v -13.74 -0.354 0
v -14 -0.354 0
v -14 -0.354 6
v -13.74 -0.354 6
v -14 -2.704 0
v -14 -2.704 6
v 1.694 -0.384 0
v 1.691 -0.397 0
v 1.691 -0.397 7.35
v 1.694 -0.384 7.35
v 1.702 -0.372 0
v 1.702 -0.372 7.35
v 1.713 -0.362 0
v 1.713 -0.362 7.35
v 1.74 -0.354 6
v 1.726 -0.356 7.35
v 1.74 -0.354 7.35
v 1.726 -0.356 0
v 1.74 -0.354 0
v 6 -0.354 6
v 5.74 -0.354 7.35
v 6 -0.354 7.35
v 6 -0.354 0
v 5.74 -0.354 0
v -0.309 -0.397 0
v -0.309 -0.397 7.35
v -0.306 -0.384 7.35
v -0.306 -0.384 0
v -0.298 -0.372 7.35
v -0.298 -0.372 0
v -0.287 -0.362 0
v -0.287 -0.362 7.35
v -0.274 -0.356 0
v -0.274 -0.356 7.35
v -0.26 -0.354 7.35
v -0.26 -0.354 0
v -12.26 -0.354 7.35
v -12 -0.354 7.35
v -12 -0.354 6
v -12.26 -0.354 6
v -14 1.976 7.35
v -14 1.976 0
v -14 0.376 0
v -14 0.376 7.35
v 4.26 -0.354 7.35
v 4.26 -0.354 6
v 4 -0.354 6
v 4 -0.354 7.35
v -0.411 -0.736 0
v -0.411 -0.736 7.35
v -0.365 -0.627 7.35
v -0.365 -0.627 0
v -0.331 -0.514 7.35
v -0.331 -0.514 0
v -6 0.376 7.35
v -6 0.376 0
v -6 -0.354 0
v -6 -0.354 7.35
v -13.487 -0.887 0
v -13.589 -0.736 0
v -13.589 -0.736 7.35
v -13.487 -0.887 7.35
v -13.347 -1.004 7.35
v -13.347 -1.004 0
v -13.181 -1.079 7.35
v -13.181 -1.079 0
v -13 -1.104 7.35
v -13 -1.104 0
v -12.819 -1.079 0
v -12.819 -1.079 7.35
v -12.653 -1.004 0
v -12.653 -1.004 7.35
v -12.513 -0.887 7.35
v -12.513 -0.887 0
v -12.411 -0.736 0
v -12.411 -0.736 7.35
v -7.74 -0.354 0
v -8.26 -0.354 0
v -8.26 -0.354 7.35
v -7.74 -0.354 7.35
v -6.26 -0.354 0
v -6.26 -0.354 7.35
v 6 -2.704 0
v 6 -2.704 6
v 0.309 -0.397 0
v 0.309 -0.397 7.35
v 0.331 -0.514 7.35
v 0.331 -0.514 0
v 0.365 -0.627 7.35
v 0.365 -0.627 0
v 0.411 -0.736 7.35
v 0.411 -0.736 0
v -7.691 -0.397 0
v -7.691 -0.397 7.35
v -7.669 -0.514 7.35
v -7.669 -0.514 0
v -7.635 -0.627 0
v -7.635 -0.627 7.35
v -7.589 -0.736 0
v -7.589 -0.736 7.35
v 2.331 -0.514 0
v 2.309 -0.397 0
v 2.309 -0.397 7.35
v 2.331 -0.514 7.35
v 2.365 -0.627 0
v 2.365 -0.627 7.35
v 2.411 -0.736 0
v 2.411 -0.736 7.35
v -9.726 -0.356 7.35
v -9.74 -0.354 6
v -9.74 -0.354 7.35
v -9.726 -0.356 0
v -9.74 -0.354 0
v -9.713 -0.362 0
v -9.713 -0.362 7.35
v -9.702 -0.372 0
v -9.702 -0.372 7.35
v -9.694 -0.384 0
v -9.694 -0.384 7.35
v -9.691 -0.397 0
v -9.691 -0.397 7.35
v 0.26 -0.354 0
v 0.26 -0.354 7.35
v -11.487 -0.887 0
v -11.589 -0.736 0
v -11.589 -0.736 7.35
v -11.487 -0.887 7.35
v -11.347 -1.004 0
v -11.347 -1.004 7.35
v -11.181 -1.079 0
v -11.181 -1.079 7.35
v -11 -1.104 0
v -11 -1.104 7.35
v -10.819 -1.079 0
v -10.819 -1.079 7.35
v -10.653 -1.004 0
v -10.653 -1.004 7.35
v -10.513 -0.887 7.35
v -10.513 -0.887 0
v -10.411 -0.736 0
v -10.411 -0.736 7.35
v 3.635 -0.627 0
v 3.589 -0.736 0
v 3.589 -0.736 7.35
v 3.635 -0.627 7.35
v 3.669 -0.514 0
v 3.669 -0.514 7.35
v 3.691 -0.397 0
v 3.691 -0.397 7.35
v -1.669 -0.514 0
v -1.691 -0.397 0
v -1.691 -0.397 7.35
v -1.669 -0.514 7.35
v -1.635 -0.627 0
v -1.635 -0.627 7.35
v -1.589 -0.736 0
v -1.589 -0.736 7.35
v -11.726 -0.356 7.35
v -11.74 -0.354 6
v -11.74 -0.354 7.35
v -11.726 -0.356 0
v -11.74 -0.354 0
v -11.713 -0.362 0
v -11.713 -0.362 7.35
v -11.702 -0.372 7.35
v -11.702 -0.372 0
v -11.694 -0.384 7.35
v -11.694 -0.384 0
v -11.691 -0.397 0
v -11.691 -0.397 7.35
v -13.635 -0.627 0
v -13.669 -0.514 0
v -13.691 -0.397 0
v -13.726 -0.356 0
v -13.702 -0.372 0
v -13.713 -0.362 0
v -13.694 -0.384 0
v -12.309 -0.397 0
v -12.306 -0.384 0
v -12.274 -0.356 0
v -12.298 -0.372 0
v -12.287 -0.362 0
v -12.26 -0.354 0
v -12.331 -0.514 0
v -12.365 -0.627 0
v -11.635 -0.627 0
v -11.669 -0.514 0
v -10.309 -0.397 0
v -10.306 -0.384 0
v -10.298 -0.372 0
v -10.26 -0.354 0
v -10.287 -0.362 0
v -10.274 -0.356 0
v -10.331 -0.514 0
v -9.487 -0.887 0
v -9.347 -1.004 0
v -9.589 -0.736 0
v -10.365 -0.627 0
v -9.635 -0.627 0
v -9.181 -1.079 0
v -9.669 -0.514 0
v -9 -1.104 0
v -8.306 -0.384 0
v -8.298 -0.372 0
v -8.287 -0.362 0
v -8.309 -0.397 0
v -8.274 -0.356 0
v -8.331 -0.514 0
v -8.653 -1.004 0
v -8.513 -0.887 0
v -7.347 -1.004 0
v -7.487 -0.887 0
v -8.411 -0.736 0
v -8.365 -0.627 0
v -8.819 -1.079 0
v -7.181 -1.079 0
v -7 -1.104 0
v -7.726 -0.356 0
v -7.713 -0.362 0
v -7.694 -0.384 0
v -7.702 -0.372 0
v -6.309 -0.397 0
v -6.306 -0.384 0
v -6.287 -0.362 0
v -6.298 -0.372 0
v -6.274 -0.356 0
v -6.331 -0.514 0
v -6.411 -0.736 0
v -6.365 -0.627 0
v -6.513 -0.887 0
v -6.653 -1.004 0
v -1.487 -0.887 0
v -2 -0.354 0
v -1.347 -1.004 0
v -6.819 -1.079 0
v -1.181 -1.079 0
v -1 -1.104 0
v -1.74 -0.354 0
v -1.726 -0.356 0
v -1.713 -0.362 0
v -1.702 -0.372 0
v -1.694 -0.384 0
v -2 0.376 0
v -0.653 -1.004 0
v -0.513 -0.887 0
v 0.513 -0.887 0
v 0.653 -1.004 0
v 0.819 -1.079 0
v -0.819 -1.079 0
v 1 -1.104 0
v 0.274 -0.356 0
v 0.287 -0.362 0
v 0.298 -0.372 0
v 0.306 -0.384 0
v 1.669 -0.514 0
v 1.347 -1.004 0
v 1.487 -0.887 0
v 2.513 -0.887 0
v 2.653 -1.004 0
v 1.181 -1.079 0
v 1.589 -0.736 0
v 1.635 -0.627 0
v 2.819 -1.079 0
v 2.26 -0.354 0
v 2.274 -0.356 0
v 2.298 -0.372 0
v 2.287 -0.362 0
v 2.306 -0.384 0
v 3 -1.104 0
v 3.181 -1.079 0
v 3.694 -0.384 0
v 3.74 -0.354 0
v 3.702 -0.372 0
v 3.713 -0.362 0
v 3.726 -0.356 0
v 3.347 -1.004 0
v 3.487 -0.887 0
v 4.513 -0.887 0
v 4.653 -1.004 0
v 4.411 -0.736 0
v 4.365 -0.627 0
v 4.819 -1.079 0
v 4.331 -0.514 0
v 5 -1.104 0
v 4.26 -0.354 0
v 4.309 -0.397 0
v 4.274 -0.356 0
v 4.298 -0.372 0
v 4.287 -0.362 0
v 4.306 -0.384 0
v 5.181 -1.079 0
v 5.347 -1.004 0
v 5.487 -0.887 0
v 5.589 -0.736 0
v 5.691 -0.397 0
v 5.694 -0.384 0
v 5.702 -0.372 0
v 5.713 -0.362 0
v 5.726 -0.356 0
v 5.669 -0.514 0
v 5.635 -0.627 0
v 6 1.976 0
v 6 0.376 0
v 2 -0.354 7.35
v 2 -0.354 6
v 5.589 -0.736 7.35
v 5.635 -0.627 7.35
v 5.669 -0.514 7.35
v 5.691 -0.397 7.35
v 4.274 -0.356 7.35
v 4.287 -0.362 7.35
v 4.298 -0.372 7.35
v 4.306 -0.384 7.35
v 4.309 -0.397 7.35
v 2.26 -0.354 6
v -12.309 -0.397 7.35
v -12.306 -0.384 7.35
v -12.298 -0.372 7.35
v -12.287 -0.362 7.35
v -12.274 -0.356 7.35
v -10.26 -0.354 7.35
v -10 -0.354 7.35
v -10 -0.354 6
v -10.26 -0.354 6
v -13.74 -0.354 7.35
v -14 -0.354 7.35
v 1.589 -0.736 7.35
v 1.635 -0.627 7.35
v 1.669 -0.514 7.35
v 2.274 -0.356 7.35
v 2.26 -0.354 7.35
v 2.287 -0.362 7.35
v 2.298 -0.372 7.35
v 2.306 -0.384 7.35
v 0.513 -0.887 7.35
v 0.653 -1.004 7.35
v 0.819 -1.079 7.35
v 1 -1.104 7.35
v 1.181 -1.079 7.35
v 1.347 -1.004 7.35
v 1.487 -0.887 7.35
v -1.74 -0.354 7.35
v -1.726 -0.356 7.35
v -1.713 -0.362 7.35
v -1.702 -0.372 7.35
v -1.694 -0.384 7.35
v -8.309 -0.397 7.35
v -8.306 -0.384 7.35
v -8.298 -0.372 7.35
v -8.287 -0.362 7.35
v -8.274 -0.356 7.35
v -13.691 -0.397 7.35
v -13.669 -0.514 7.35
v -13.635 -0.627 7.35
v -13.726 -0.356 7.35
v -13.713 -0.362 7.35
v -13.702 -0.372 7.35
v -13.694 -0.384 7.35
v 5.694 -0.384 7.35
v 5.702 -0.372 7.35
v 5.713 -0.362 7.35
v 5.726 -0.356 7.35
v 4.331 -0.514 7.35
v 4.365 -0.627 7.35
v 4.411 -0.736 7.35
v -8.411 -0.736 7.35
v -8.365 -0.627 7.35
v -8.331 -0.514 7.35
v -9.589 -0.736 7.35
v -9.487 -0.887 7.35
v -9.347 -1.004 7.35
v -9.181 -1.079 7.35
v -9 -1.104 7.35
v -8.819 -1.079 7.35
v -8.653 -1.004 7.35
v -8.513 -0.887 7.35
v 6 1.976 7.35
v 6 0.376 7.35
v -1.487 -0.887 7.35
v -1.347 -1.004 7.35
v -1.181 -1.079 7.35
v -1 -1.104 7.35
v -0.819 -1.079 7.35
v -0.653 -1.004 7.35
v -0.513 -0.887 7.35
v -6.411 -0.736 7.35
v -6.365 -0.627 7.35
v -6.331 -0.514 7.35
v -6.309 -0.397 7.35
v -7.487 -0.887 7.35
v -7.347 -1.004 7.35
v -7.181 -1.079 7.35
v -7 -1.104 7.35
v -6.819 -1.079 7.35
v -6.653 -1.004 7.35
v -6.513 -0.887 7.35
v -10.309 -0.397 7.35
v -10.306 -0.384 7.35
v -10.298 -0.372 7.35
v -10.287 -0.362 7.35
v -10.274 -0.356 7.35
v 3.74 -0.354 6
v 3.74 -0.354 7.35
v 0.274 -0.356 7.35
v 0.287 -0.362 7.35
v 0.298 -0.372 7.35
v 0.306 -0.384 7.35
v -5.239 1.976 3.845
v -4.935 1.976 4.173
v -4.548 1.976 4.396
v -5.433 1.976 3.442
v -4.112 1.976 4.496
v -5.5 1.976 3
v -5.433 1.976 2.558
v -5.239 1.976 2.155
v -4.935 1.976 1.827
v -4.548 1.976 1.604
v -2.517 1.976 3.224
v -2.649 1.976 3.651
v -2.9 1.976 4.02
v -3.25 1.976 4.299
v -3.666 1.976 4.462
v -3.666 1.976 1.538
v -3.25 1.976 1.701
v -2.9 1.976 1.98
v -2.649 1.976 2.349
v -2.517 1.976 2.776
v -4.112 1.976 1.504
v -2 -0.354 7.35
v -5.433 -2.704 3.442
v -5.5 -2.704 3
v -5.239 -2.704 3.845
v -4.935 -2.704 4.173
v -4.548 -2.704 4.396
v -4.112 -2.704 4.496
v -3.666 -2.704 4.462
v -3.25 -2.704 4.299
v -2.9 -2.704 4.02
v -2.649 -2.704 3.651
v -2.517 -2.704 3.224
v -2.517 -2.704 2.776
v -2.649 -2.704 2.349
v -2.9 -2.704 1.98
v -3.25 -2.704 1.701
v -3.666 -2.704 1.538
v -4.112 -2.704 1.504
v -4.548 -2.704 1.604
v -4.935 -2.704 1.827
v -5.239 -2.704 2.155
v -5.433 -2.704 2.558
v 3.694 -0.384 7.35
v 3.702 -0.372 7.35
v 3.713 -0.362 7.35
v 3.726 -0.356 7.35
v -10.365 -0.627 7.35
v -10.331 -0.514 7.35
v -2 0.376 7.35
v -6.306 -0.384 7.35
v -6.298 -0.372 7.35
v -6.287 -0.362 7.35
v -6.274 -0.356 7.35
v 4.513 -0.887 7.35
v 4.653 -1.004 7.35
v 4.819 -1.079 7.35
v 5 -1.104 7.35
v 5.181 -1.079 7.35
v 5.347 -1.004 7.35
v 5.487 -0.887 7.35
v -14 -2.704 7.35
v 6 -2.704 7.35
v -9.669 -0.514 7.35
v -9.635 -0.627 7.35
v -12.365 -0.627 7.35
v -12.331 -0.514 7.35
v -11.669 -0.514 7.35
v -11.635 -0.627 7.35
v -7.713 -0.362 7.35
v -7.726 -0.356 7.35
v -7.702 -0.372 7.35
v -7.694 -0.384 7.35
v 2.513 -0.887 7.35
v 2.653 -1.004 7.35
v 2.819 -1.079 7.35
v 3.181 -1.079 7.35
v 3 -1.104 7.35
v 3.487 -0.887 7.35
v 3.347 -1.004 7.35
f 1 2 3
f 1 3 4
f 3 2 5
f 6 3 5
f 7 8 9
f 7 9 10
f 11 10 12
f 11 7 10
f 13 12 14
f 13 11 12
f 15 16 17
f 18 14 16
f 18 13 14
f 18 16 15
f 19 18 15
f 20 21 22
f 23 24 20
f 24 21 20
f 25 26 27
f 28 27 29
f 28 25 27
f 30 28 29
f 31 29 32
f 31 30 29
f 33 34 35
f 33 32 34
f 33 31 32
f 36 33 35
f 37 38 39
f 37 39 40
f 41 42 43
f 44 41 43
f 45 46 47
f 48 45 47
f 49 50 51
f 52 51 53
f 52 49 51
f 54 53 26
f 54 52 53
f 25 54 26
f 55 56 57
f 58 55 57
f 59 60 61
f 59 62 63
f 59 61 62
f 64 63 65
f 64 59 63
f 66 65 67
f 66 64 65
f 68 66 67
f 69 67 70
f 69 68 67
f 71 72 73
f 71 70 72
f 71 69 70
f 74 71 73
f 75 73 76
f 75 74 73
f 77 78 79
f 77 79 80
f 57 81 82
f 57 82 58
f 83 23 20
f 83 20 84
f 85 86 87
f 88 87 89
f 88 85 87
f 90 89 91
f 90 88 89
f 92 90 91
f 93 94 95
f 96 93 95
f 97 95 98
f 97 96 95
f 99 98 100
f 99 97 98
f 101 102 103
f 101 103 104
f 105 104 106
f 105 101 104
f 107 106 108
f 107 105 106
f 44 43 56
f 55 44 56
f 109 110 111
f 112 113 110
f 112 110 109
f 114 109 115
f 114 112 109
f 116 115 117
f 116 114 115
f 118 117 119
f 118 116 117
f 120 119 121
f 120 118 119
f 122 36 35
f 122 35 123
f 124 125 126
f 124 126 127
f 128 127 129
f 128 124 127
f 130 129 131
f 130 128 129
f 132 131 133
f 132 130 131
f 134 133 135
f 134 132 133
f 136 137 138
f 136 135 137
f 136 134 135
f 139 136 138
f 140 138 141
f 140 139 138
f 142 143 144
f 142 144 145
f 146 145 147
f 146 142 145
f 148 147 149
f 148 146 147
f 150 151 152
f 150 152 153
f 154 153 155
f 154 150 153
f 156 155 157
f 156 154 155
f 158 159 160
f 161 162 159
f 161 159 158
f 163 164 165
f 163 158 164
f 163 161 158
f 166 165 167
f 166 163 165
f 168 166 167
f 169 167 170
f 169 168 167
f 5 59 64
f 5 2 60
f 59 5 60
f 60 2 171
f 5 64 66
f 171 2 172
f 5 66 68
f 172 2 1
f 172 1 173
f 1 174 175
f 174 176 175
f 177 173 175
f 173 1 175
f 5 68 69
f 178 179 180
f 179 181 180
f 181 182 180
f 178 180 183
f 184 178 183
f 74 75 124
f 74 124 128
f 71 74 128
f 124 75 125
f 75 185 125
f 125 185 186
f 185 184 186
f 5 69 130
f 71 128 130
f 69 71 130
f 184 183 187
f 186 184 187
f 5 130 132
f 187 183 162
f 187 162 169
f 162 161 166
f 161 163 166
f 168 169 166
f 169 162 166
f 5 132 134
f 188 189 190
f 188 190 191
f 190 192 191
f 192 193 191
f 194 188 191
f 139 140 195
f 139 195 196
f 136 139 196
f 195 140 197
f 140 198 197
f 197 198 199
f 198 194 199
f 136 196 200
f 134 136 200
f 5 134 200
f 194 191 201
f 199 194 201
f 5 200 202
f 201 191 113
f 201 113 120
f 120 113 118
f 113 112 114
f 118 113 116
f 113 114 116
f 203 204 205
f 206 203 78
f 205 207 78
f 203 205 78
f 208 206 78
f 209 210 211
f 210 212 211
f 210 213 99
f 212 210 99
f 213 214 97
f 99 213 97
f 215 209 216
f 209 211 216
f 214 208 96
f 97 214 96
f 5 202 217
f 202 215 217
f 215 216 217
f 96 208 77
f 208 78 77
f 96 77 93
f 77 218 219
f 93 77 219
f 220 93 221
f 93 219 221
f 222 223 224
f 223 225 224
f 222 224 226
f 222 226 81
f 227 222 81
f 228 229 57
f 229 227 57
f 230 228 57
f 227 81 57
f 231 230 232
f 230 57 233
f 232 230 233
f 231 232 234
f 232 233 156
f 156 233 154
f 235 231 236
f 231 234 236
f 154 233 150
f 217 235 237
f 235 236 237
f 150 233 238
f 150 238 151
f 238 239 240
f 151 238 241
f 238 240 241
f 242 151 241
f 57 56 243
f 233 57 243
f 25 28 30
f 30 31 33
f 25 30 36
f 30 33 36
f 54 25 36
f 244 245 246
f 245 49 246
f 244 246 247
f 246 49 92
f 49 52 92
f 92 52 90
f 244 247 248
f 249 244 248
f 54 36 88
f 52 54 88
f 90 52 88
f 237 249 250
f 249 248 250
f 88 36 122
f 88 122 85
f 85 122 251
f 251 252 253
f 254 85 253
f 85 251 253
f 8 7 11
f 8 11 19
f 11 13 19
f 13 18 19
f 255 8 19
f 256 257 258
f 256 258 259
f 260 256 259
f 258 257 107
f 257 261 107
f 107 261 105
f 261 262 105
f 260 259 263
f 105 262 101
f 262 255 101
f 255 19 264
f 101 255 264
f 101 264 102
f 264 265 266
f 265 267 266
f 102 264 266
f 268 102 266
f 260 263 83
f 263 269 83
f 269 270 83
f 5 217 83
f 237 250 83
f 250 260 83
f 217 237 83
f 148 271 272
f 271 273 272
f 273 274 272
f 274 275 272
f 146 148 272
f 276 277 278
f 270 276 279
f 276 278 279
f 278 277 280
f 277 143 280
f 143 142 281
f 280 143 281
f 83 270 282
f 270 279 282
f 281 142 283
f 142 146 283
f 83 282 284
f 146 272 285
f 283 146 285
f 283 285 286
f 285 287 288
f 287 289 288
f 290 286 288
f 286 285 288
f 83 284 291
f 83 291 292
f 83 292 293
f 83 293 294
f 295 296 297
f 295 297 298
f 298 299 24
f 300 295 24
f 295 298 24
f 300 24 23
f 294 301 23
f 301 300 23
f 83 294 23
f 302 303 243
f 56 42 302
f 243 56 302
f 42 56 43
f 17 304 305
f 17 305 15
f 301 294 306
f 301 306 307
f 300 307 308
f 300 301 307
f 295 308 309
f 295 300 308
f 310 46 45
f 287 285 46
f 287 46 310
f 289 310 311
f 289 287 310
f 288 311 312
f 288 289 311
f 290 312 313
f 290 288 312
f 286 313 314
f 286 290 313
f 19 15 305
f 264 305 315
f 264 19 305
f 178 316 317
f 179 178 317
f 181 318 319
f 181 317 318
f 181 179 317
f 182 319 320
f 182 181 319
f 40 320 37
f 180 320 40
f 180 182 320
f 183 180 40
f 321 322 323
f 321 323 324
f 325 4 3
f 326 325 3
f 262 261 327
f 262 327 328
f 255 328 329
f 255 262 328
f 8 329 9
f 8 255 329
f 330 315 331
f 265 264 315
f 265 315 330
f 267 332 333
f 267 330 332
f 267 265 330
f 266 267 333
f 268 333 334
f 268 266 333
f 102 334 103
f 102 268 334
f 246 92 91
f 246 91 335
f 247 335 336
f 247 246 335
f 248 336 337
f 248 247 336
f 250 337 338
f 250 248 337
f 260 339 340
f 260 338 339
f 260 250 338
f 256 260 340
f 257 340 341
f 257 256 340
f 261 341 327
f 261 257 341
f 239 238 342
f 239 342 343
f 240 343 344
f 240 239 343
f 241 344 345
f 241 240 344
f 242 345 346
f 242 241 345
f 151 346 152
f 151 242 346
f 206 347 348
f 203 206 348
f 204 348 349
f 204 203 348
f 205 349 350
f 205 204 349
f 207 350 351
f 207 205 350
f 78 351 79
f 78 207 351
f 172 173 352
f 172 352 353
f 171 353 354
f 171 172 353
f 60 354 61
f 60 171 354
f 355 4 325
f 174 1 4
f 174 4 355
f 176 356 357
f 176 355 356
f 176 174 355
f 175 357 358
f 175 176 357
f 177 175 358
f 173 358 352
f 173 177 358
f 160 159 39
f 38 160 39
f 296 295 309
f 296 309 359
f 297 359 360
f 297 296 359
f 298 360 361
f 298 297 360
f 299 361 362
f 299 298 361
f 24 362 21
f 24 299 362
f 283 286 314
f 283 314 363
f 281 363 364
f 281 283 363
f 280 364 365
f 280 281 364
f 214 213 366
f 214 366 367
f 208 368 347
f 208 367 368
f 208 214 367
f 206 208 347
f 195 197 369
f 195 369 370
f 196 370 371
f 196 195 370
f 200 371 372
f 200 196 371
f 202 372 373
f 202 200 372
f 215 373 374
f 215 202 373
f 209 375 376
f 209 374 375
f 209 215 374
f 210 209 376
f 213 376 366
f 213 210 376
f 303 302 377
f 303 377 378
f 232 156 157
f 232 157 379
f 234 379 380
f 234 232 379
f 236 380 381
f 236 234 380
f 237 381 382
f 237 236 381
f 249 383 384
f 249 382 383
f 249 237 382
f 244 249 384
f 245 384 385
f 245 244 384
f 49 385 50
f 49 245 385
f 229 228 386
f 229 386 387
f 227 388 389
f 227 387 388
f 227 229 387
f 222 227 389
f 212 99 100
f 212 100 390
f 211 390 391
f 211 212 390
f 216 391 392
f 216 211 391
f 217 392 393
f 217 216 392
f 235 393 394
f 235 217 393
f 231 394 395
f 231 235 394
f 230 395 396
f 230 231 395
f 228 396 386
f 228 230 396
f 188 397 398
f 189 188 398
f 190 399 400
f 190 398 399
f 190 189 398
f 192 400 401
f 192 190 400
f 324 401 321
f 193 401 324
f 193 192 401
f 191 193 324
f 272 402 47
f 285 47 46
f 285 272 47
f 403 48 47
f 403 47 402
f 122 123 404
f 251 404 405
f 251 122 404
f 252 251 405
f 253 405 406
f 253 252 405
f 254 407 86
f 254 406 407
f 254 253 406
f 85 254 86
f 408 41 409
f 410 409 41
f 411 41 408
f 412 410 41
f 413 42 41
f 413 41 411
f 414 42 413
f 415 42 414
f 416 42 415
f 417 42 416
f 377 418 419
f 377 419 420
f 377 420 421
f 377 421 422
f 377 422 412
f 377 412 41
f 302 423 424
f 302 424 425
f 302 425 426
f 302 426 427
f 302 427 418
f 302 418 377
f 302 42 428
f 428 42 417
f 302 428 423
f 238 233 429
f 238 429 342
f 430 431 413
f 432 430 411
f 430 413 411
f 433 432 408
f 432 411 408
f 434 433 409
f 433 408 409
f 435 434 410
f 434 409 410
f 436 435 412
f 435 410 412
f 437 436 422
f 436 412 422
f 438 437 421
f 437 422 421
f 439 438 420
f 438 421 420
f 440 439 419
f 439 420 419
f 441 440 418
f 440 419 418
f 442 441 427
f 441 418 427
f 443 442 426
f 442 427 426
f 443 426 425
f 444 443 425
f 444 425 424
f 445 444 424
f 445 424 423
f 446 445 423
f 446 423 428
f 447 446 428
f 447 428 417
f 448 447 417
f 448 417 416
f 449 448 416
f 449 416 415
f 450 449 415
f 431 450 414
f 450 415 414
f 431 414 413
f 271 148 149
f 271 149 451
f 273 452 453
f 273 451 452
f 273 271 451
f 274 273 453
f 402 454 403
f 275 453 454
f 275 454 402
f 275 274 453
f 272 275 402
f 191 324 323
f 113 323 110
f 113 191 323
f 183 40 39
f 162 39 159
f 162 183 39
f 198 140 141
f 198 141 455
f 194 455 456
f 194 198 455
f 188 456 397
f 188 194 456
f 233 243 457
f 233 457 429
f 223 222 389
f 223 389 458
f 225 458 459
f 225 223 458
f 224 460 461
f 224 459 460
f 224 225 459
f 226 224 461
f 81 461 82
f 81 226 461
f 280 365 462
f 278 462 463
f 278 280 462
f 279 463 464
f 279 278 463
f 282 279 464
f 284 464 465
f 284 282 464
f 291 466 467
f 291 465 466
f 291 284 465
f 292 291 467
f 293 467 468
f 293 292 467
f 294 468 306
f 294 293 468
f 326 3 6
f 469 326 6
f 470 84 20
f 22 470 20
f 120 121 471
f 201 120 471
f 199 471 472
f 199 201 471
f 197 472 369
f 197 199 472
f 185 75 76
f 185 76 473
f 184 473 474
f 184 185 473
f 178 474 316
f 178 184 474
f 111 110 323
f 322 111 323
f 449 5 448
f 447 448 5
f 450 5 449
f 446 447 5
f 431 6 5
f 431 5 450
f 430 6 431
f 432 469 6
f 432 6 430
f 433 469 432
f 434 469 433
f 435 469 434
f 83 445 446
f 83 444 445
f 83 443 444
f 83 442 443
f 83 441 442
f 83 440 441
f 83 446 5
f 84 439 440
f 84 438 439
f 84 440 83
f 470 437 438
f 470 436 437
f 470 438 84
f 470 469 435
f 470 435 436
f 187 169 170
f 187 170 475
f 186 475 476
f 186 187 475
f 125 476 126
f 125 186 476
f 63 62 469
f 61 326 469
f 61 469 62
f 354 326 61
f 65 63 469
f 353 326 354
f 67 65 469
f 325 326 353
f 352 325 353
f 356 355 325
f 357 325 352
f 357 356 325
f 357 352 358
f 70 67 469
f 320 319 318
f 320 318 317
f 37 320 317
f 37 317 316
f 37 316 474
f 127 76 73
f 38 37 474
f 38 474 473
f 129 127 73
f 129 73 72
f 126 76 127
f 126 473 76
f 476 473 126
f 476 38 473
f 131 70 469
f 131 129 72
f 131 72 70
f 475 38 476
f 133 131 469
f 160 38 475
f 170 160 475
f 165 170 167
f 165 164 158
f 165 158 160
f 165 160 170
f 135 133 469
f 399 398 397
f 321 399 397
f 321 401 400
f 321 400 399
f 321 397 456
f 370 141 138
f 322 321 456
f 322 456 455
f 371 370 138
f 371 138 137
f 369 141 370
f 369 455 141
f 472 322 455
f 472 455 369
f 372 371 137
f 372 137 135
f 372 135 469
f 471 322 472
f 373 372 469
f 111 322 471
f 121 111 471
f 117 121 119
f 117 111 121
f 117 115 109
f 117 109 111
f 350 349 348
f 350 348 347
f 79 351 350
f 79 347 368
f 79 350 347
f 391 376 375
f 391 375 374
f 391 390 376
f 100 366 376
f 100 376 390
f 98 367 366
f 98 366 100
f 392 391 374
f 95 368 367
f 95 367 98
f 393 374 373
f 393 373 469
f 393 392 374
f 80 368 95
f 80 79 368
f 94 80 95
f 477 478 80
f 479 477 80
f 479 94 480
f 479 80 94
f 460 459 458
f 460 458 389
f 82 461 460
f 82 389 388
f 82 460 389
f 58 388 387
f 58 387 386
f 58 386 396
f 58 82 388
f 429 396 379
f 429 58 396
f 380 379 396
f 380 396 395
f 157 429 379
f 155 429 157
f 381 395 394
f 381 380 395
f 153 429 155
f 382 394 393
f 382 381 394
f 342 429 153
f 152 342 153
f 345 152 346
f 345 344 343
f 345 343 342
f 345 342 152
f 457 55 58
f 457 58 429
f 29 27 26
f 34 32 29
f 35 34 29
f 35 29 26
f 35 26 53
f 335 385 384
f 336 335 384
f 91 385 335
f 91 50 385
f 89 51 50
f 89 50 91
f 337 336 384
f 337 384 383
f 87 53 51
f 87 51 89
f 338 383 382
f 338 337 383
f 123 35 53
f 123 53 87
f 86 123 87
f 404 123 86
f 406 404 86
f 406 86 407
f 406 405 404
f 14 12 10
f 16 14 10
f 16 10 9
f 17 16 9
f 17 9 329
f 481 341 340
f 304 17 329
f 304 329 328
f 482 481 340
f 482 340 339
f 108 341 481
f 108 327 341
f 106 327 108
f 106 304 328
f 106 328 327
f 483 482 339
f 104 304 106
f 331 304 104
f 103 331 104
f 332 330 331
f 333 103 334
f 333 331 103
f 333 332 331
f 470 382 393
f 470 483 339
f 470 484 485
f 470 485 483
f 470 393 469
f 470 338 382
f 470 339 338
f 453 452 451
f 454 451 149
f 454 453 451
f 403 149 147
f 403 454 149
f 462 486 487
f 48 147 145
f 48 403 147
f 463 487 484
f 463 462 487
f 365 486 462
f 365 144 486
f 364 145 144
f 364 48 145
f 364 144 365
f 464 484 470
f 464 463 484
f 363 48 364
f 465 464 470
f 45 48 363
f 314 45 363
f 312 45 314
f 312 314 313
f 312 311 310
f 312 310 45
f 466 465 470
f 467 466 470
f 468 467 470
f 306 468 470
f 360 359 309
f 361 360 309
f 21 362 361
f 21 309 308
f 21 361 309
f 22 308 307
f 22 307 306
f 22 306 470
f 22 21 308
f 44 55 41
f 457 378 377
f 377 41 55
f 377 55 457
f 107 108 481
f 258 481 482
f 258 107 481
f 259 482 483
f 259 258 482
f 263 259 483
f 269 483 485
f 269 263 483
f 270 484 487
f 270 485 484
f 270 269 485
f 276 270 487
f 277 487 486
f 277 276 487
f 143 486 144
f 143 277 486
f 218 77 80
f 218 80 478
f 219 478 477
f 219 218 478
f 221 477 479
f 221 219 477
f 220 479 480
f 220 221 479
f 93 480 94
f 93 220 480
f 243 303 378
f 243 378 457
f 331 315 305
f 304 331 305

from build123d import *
from OCP.BRepAlgoAPI import BRepAlgoAPI_Cut
from OCP.TopTools import TopTools_ListOfShape

# Parameters (mm, degrees)
BOSS_EXTRUDE1_DEPTH     = 6
SKETCH2_R               = 1.5
CUT_EXTRUDE1_DEPTH      = 17.153773553
CUT_EXTRUDE2_START      = -6
CUT_EXTRUDE2_DEPTH      = 6
SALIENTE_EXTRUIR1_DEPTH = 1.35
CORTAR_EXTRUIR1_START   = -0.3
CROQUIS5_W              = 20
CROQUIS5_H              = 7.35
CROQUIS5_R              = 1.5
CORTAR_EXTRUIR1_DEPTH   = 0.3
CROQUIS6_W              = 20
CROQUIS6_H              = 7.35
CROQUIS6_R              = 1.5
CORTAR_EXTRUIR2_DEPTH   = 0.4


with BuildPart() as part:
    # Sketch1 → Boss-Extrude1 (new body)
    with BuildSketch(Plane.XY):
        with BuildLine():
            Line((-0.259824575, -0.254), (0, -0.254))
            Line((0, -0.254), (0.259824575, -0.254))
            ThreePointArc((0.259824575, -0.254), (0.358731646, -0.291228588), (0.408543109, -0.384434783))
            ThreePointArc((0.408543109, -0.384434783), (0.442388286, -0.542062154), (0.501123596, -0.692202247))
            ThreePointArc((0.501123596, -0.692202247), (1, -1.004), (1.498876404, -0.692202247))
            ThreePointArc((1.498876404, -0.692202247), (1.557611714, -0.542062154), (1.591456891, -0.384434783))
            ThreePointArc((1.591456891, -0.384434783), (1.641268354, -0.291228588), (1.740175425, -0.254))
            Line((1.740175425, -0.254), (2, -0.254))
            Line((2, -0.254), (2.259824575, -0.254))
            ThreePointArc((2.259824575, -0.254), (2.358731646, -0.291228588), (2.408543109, -0.384434783))
            ThreePointArc((2.408543109, -0.384434783), (2.442388286, -0.542062154), (2.501123596, -0.692202247))
            ThreePointArc((2.501123596, -0.692202247), (3, -1.004), (3.498876404, -0.692202247))
            ThreePointArc((3.498876404, -0.692202247), (3.557611714, -0.542062154), (3.591456891, -0.384434783))
            ThreePointArc((3.591456891, -0.384434783), (3.641268354, -0.291228588), (3.740175425, -0.254))
            Line((3.740175425, -0.254), (4, -0.254))
            Line((4, -0.254), (4.259824575, -0.254))
            ThreePointArc((4.259824575, -0.254), (4.358731646, -0.291228588), (4.408543109, -0.384434783))
            ThreePointArc((4.408543109, -0.384434783), (4.442388286, -0.542062154), (4.501123596, -0.692202247))
            ThreePointArc((4.501123596, -0.692202247), (5, -1.004), (5.498876404, -0.692202247))
            ThreePointArc((5.498876404, -0.692202247), (5.557611714, -0.542062154), (5.591456891, -0.384434783))
            ThreePointArc((5.591456891, -0.384434783), (5.641268354, -0.291228588), (5.740175425, -0.254))
            Line((5.740175425, -0.254), (6, -0.254))
            Line((6, -0.254), (6, -3.004))
            Line((6, -3.004), (-3.198960597, -3.004))
            Line((-3.198960597, -3.004), (-4, -3.004))
            Line((-4, -3.004), (-4, 2.376))
            Line((-4, 2.376), (6, 2.376))
            Line((6, 2.376), (6, 0.376))
            Line((6, 0.376), (-2, 0.376))
            Line((-2, 0.376), (-2, -0.254))
            Line((-2, -0.254), (-1.740175425, -0.254))
            ThreePointArc((-1.740175425, -0.254), (-1.641268354, -0.291228588), (-1.591456891, -0.384434783))
            ThreePointArc((-1.591456891, -0.384434783), (-1.557611714, -0.542062154), (-1.498876404, -0.692202247))
            ThreePointArc((-1.498876404, -0.692202247), (-1, -1.004), (-0.501123596, -0.692202247))
            ThreePointArc((-0.501123596, -0.692202247), (-0.442388286, -0.542062154), (-0.408543109, -0.384434783))
            ThreePointArc((-0.408543109, -0.384434783), (-0.358731646, -0.291228588), (-0.259824575, -0.254))
        make_face()
    extrude(amount=BOSS_EXTRUDE1_DEPTH)

    # Mirror1: part across plane


with BuildPart() as part_1:
    add(part.part)
    add(part.part.mirror(Plane(origin=(-4, 2.376, 6), x_dir=(0, 0, 1), z_dir=(1, 0, 0))))

    # Sketch2 → Cut-Extrude1 (cut, through all)
    with BuildSketch(Plane(origin=(0, 2.376, 0), x_dir=(1, 0, 0), z_dir=(0, 1, 0))):
        with Locations(Location((-4, -3, 0), (0, 0, 180))):
            Circle(SKETCH2_R)
    extrude(amount=-CUT_EXTRUDE1_DEPTH, mode=Mode.SUBTRACT)


with BuildPart() as cut_extrude2_tool:
    # Cut-Extrude2: read off the stored shape, not the designer's step
    # Cut-Extrude2 outline → Cut-Extrude2 (new body)
    with BuildSketch(Plane.XY.offset(6).offset(CUT_EXTRUDE2_START)):
        with BuildLine():
            Line((-1.740175425, -0.254), (-2, -0.254))
            Line((-2, -0.254), (-2, -0.35400144))
            Line((-2, -0.35400144), (-1.740174871, -0.354))
            ThreePointArc((-1.740174871, -0.354), (-1.707206193, -0.366409712), (-1.690602581, -0.397478261))
            ThreePointArc((-1.690602581, -0.397478261), (-1.653372886, -0.570868369), (-1.588764045, -0.736022472))
            ThreePointArc((-1.588764045, -0.736022472), (-1, -1.104), (-0.411235955, -0.736022472))
            ThreePointArc((-0.411235955, -0.736022472), (-0.346627114, -0.570868369), (-0.309397419, -0.397478261))
            ThreePointArc((-0.309397419, -0.397478261), (-0.292793599, -0.366409529), (-0.259824575, -0.354))
            Line((-0.259824575, -0.354), (0.259824575, -0.354))
            ThreePointArc((0.259824575, -0.354), (0.292793599, -0.366409529), (0.309397419, -0.397478261))
            ThreePointArc((0.309397419, -0.397478261), (0.346627114, -0.570868369), (0.411235955, -0.736022472))
            ThreePointArc((0.411235955, -0.736022472), (1, -1.104), (1.588764045, -0.736022472))
            ThreePointArc((1.588764045, -0.736022472), (1.653372886, -0.570868369), (1.690602581, -0.397478261))
            ThreePointArc((1.690602581, -0.397478261), (1.707206401, -0.366409529), (1.740175425, -0.354))
            Line((1.740175425, -0.354), (2.259824575, -0.35400144))
            ThreePointArc((2.259824575, -0.35400144), (2.292793599, -0.366410969), (2.309397419, -0.397479701))
            ThreePointArc((2.309397419, -0.397479701), (2.346627114, -0.570869809), (2.411235955, -0.736023912))
            ThreePointArc((2.411235955, -0.736023912), (3, -1.10400144), (3.588764045, -0.736023912))
            ThreePointArc((3.588764045, -0.736023912), (3.653372886, -0.570869809), (3.690602581, -0.397479701))
            ThreePointArc((3.690602581, -0.397479701), (3.707206401, -0.366410969), (3.740175425, -0.35400144))
            Line((3.740175425, -0.35400144), (4.259824575, -0.35400288))
            ThreePointArc((4.259824575, -0.35400288), (4.292793599, -0.366412409), (4.309397419, -0.397481141))
            ThreePointArc((4.309397419, -0.397481141), (4.346627114, -0.570871249), (4.411235955, -0.736025352))
            ThreePointArc((4.411235955, -0.736025352), (5, -1.10400288), (5.588764045, -0.736025352))
            ThreePointArc((5.588764045, -0.736025352), (5.653372886, -0.570871249), (5.690602581, -0.397481141))
            ThreePointArc((5.690602581, -0.397481141), (5.707206401, -0.366412409), (5.740175425, -0.35400288))
            Line((5.740175425, -0.35400288), (5.999999446, -0.35400432))
            Line((5.999999446, -0.35400432), (6, -0.254))
            Line((6, -0.254), (5.740175425, -0.254))
            ThreePointArc((5.740175425, -0.254), (5.641268354, -0.291228588), (5.591456891, -0.384434783))
            ThreePointArc((5.591456891, -0.384434783), (5.557611714, -0.542062154), (5.498876404, -0.692202247))
            ThreePointArc((5.498876404, -0.692202247), (5, -1.004), (4.501123596, -0.692202247))
            ThreePointArc((4.501123596, -0.692202247), (4.442388286, -0.542062154), (4.408543109, -0.384434783))
            ThreePointArc((4.408543109, -0.384434783), (4.358731646, -0.291228588), (4.259824575, -0.254))
            Line((4.259824575, -0.254), (3.740175425, -0.254))
            ThreePointArc((3.740175425, -0.254), (3.641268354, -0.291228588), (3.591456891, -0.384434783))
            ThreePointArc((3.591456891, -0.384434783), (3.557611714, -0.542062154), (3.498876404, -0.692202247))
            ThreePointArc((3.498876404, -0.692202247), (3, -1.004), (2.501123596, -0.692202247))
            ThreePointArc((2.501123596, -0.692202247), (2.442388286, -0.542062154), (2.408543109, -0.384434783))
            ThreePointArc((2.408543109, -0.384434783), (2.358731646, -0.291228588), (2.259824575, -0.254))
            Line((2.259824575, -0.254), (1.740175425, -0.254))
            ThreePointArc((1.740175425, -0.254), (1.641268354, -0.291228588), (1.591456891, -0.384434783))
            ThreePointArc((1.591456891, -0.384434783), (1.557611714, -0.542062154), (1.498876404, -0.692202247))
            ThreePointArc((1.498876404, -0.692202247), (1, -1.004), (0.501123596, -0.692202247))
            ThreePointArc((0.501123596, -0.692202247), (0.442388286, -0.542062154), (0.408543109, -0.384434783))
            ThreePointArc((0.408543109, -0.384434783), (0.358731646, -0.291228588), (0.259824575, -0.254))
            Line((0.259824575, -0.254), (-0.259824575, -0.254))
            ThreePointArc((-0.259824575, -0.254), (-0.358731646, -0.291228588), (-0.408543109, -0.384434783))
            ThreePointArc((-0.408543109, -0.384434783), (-0.442388286, -0.542062154), (-0.501123596, -0.692202247))
            ThreePointArc((-0.501123596, -0.692202247), (-1, -1.004), (-1.498876404, -0.692202247))
            ThreePointArc((-1.498876404, -0.692202247), (-1.557611714, -0.542062154), (-1.591456891, -0.384434783))
            ThreePointArc((-1.591456891, -0.384434783), (-1.641268354, -0.291228588), (-1.740175425, -0.254))
        make_face()
        with BuildLine():
            Line((-6.259825129, -0.354), (-6, -0.35400144))
            Line((-6, -0.35400144), (-6, -0.254))
            Line((-6, -0.254), (-6.259824575, -0.254))
            ThreePointArc((-6.259824575, -0.254), (-6.358731646, -0.291228588), (-6.408543109, -0.384434783))
            ThreePointArc((-6.408543109, -0.384434783), (-6.442388286, -0.542062154), (-6.501123596, -0.692202247))
            ThreePointArc((-6.501123596, -0.692202247), (-7, -1.004), (-7.498876404, -0.692202247))
            ThreePointArc((-7.498876404, -0.692202247), (-7.557611714, -0.542062154), (-7.591456891, -0.384434783))
            ThreePointArc((-7.591456891, -0.384434783), (-7.641268354, -0.291228588), (-7.740175425, -0.254))
            Line((-7.740175425, -0.254), (-8.259824575, -0.254))
            ThreePointArc((-8.259824575, -0.254), (-8.358731646, -0.291228588), (-8.408543109, -0.384434783))
            ThreePointArc((-8.408543109, -0.384434783), (-8.442388286, -0.542062154), (-8.501123596, -0.692202247))
            ThreePointArc((-8.501123596, -0.692202247), (-9, -1.004), (-9.498876404, -0.692202247))
            ThreePointArc((-9.498876404, -0.692202247), (-9.557611714, -0.542062154), (-9.591456891, -0.384434783))
            ThreePointArc((-9.591456891, -0.384434783), (-9.641268354, -0.291228588), (-9.740175425, -0.254))
            Line((-9.740175425, -0.254), (-10.259824575, -0.254))
            ThreePointArc((-10.259824575, -0.254), (-10.358731646, -0.291228588), (-10.408543109, -0.384434783))
            ThreePointArc((-10.408543109, -0.384434783), (-10.442388286, -0.542062154), (-10.501123596, -0.692202247))
            ThreePointArc((-10.501123596, -0.692202247), (-11, -1.004), (-11.498876404, -0.692202247))
            ThreePointArc((-11.498876404, -0.692202247), (-11.557611714, -0.542062154), (-11.591456891, -0.384434783))
            ThreePointArc((-11.591456891, -0.384434783), (-11.641268354, -0.291228588), (-11.740175425, -0.254))
            Line((-11.740175425, -0.254), (-12.259824575, -0.254))
            ThreePointArc((-12.259824575, -0.254), (-12.358731646, -0.291228588), (-12.408543109, -0.384434783))
            ThreePointArc((-12.408543109, -0.384434783), (-12.442388286, -0.542062154), (-12.501123596, -0.692202247))
            ThreePointArc((-12.501123596, -0.692202247), (-13, -1.004), (-13.498876404, -0.692202247))
            ThreePointArc((-13.498876404, -0.692202247), (-13.557611714, -0.542062154), (-13.591456891, -0.384434783))
            ThreePointArc((-13.591456891, -0.384434783), (-13.641268354, -0.291228588), (-13.740175425, -0.254))
            Line((-13.740175425, -0.254), (-14, -0.254))
            Line((-14, -0.254), (-14, -0.35400396))
            Line((-14, -0.35400396), (-13.740175425, -0.35400288))
            ThreePointArc((-13.740175425, -0.35400288), (-13.707206401, -0.366412409), (-13.690602581, -0.397481141))
            ThreePointArc((-13.690602581, -0.397481141), (-13.653372886, -0.570871249), (-13.588764045, -0.736025352))
            ThreePointArc((-13.588764045, -0.736025352), (-13, -1.10400288), (-12.411235955, -0.736025352))
            ThreePointArc((-12.411235955, -0.736025352), (-12.346627114, -0.570871249), (-12.309397419, -0.397481141))
            ThreePointArc((-12.309397419, -0.397481141), (-12.292793599, -0.366412409), (-12.259824575, -0.35400288))
            Line((-12.259824575, -0.35400288), (-11.740175425, -0.35400144))
            ThreePointArc((-11.740175425, -0.35400144), (-11.707206401, -0.366410969), (-11.690602581, -0.397479701))
            ThreePointArc((-11.690602581, -0.397479701), (-11.653372886, -0.570869809), (-11.588764045, -0.736023912))
            ThreePointArc((-11.588764045, -0.736023912), (-11, -1.10400144), (-10.411235955, -0.736023912))
            ThreePointArc((-10.411235955, -0.736023912), (-10.346627114, -0.570869809), (-10.309397419, -0.397479701))
            ThreePointArc((-10.309397419, -0.397479701), (-10.292793599, -0.366410969), (-10.259824575, -0.35400144))
            Line((-10.259824575, -0.35400144), (-9.740175425, -0.354))
            ThreePointArc((-9.740175425, -0.354), (-9.707206401, -0.366409529), (-9.690602581, -0.397478261))
            ThreePointArc((-9.690602581, -0.397478261), (-9.653372886, -0.570868369), (-9.588764045, -0.736022472))
            ThreePointArc((-9.588764045, -0.736022472), (-9, -1.104), (-8.411235955, -0.736022472))
            ThreePointArc((-8.411235955, -0.736022472), (-8.346627114, -0.570868369), (-8.309397419, -0.397478261))
            ThreePointArc((-8.309397419, -0.397478261), (-8.292793599, -0.366409529), (-8.259824575, -0.354))
            Line((-8.259824575, -0.354), (-7.740175425, -0.354))
            ThreePointArc((-7.740175425, -0.354), (-7.707206401, -0.366409529), (-7.690602581, -0.397478261))
            ThreePointArc((-7.690602581, -0.397478261), (-7.653372886, -0.570868369), (-7.588764045, -0.736022472))
            ThreePointArc((-7.588764045, -0.736022472), (-7, -1.104), (-6.411235955, -0.736022472))
            ThreePointArc((-6.411235955, -0.736022472), (-6.346627114, -0.570868369), (-6.309397419, -0.397478261))
            ThreePointArc((-6.309397419, -0.397478261), (-6.292793807, -0.366409712), (-6.259825129, -0.354))
        make_face()
    extrude(amount=CUT_EXTRUDE2_DEPTH)


with BuildPart() as part_2:
    add(part_1.part)

    # Cut-Extrude2: cut by cut_extrude2_tool, with a tolerance
    cut_extrude2_stock = TopTools_ListOfShape()
    cut_extrude2_stock.Append(part_2.part.wrapped)
    cut_extrude2_tools = TopTools_ListOfShape()
    cut_extrude2_tools.Append(cut_extrude2_tool.part.wrapped)
    cut_extrude2_cut = BRepAlgoAPI_Cut()
    cut_extrude2_cut.SetArguments(cut_extrude2_stock)
    cut_extrude2_cut.SetTools(cut_extrude2_tools)
    cut_extrude2_cut.SetFuzzyValue(0.00001)
    cut_extrude2_cut.Build()
    add(Compound.cast(cut_extrude2_cut.Shape()).solids(), mode=Mode.REPLACE)


with BuildPart() as saliente_extruir1_tool:
    # Croquis1 → Saliente-Extruir1 (new body)
    with BuildSketch(Plane.XY.offset(6)):
        with BuildLine():
            Line((-6, -0.35400144), (-6.259825129, -0.354))
            ThreePointArc((-6.259825129, -0.354), (-6.292793807, -0.366409712), (-6.309397419, -0.397478261))
            ThreePointArc((-6.309397419, -0.397478261), (-6.346627114, -0.570868369), (-6.411235955, -0.736022472))
            ThreePointArc((-6.411235955, -0.736022472), (-7, -1.104), (-7.588764045, -0.736022472))
            ThreePointArc((-7.588764045, -0.736022472), (-7.653372886, -0.570868369), (-7.690602581, -0.397478261))
            ThreePointArc((-7.690602581, -0.397478261), (-7.707206401, -0.366409529), (-7.740175425, -0.354))
            Line((-7.740175425, -0.354), (-8.259824575, -0.354))
            ThreePointArc((-8.259824575, -0.354), (-8.292793599, -0.366409529), (-8.309397419, -0.397478261))
            ThreePointArc((-8.309397419, -0.397478261), (-8.346627114, -0.570868369), (-8.411235955, -0.736022472))
            ThreePointArc((-8.411235955, -0.736022472), (-9, -1.104), (-9.588764045, -0.736022472))
            ThreePointArc((-9.588764045, -0.736022472), (-9.653372886, -0.570868369), (-9.690602581, -0.397478261))
            ThreePointArc((-9.690602581, -0.397478261), (-9.707206401, -0.366409529), (-9.740175425, -0.354))
            Line((-9.740175425, -0.354), (-9.999999446, -0.35400144))
            Line((-9.999999446, -0.35400144), (-10.259824575, -0.35400144))
            ThreePointArc((-10.259824575, -0.35400144), (-10.292793599, -0.366410969), (-10.309397419, -0.397479701))
            ThreePointArc((-10.309397419, -0.397479701), (-10.346627114, -0.570869809), (-10.411235955, -0.736023912))
            ThreePointArc((-10.411235955, -0.736023912), (-11, -1.10400144), (-11.588764045, -0.736023912))
            ThreePointArc((-11.588764045, -0.736023912), (-11.653372886, -0.570869809), (-11.690602581, -0.397479701))
            ThreePointArc((-11.690602581, -0.397479701), (-11.707206401, -0.366410969), (-11.740175425, -0.35400144))
            Line((-11.740175425, -0.35400144), (-11.999999446, -0.35400288))
            Line((-11.999999446, -0.35400288), (-12.259824575, -0.35400288))
            ThreePointArc((-12.259824575, -0.35400288), (-12.292793599, -0.366412409), (-12.309397419, -0.397481141))
            ThreePointArc((-12.309397419, -0.397481141), (-12.346627114, -0.570871249), (-12.411235955, -0.736025352))
            ThreePointArc((-12.411235955, -0.736025352), (-13, -1.10400288), (-13.588764045, -0.736025352))
            ThreePointArc((-13.588764045, -0.736025352), (-13.653372886, -0.570871249), (-13.690602581, -0.397481141))
            ThreePointArc((-13.690602581, -0.397481141), (-13.707206401, -0.366412409), (-13.740175425, -0.35400288))
            Line((-13.740175425, -0.35400288), (-13.999999446, -0.35400432))
            Line((-13.999999446, -0.35400432), (-14, -3.004))
            Line((-14, -3.004), (6, -3.004))
            Line((6, -3.004), (5.999999446, -0.35400432))
            Line((5.999999446, -0.35400432), (5.740175425, -0.35400288))
            ThreePointArc((5.740175425, -0.35400288), (5.707206401, -0.366412409), (5.690602581, -0.397481141))
            ThreePointArc((5.690602581, -0.397481141), (5.653372886, -0.570871249), (5.588764045, -0.736025352))
            ThreePointArc((5.588764045, -0.736025352), (5, -1.10400288), (4.411235955, -0.736025352))
            ThreePointArc((4.411235955, -0.736025352), (4.346627114, -0.570871249), (4.309397419, -0.397481141))
            ThreePointArc((4.309397419, -0.397481141), (4.292793599, -0.366412409), (4.259824575, -0.35400288))
            Line((4.259824575, -0.35400288), (3.999999446, -0.35400288))
            Line((3.999999446, -0.35400288), (3.740175425, -0.35400144))
            ThreePointArc((3.740175425, -0.35400144), (3.707206401, -0.366410969), (3.690602581, -0.397479701))
            ThreePointArc((3.690602581, -0.397479701), (3.653372886, -0.570869809), (3.588764045, -0.736023912))
            ThreePointArc((3.588764045, -0.736023912), (3, -1.10400144), (2.411235955, -0.736023912))
            ThreePointArc((2.411235955, -0.736023912), (2.346627114, -0.570869809), (2.309397419, -0.397479701))
            ThreePointArc((2.309397419, -0.397479701), (2.292793599, -0.366410969), (2.259824575, -0.35400144))
            Line((2.259824575, -0.35400144), (1.999999446, -0.35400144))
            Line((1.999999446, -0.35400144), (1.740175425, -0.354))
            ThreePointArc((1.740175425, -0.354), (1.707206401, -0.366409529), (1.690602581, -0.397478261))
            ThreePointArc((1.690602581, -0.397478261), (1.653372886, -0.570868369), (1.588764045, -0.736022472))
            ThreePointArc((1.588764045, -0.736022472), (1, -1.104), (0.411235955, -0.736022472))
            ThreePointArc((0.411235955, -0.736022472), (0.346627114, -0.570868369), (0.309397419, -0.397478261))
            ThreePointArc((0.309397419, -0.397478261), (0.292793599, -0.366409529), (0.259824575, -0.354))
            Line((0.259824575, -0.354), (-0.259824575, -0.354))
            ThreePointArc((-0.259824575, -0.354), (-0.292793599, -0.366409529), (-0.309397419, -0.397478261))
            ThreePointArc((-0.309397419, -0.397478261), (-0.346627114, -0.570868369), (-0.411235955, -0.736022472))
            ThreePointArc((-0.411235955, -0.736022472), (-1, -1.104), (-1.588764045, -0.736022472))
            ThreePointArc((-1.588764045, -0.736022472), (-1.653372886, -0.570868369), (-1.690602581, -0.397478261))
            ThreePointArc((-1.690602581, -0.397478261), (-1.707206193, -0.366409712), (-1.740174871, -0.354))
            Line((-1.740174871, -0.354), (-2, -0.35400144))
            Line((-2, -0.35400144), (-2, 0.376))
            Line((-2, 0.376), (6, 0.376))
            Line((6, 0.376), (6, 2.376))
            Line((6, 2.376), (-14, 2.376))
            Line((-14, 2.376), (-14, 0.376))
            Line((-14, 0.376), (-6, 0.376))
            Line((-6, 0.376), (-6, -0.35400144))
        make_face()
    extrude(amount=SALIENTE_EXTRUIR1_DEPTH)


with BuildPart() as part_3:
    add(part_2.part)


with BuildPart() as part_4:
    # Saliente-Extruir1: joined with saliente_extruir1_tool
    add(part_3.part.fuse(saliente_extruir1_tool.part, tol=0.00001))

    # Croquis5 → Cortar-Extruir1 (cut)
    with BuildSketch(Plane.XZ.offset(3.004).offset(CORTAR_EXTRUIR1_START)):
        with Locations((-4, 3.675)):
            Rectangle(CROQUIS5_W, CROQUIS5_H)
        with Locations(Location((-4, 3, 0), (0, 0, 180))):
            Circle(CROQUIS5_R, mode=Mode.SUBTRACT)
    extrude(amount=CORTAR_EXTRUIR1_DEPTH, mode=Mode.SUBTRACT)

    # Croquis6 → Cortar-Extruir2 (cut)
    with BuildSketch(Plane(origin=(0, 2.376, 0), x_dir=(1, 0, 0), z_dir=(0, 1, 0))):
        with Locations((-4, -3.675)):
            Rectangle(CROQUIS6_W, CROQUIS6_H)
        with Locations(Location((-4, -3, 0), (0, 0, 270))):
            Circle(CROQUIS6_R, mode=Mode.SUBTRACT)
    extrude(amount=-CORTAR_EXTRUIR2_DEPTH, mode=Mode.SUBTRACT)


solid = part_4.part
